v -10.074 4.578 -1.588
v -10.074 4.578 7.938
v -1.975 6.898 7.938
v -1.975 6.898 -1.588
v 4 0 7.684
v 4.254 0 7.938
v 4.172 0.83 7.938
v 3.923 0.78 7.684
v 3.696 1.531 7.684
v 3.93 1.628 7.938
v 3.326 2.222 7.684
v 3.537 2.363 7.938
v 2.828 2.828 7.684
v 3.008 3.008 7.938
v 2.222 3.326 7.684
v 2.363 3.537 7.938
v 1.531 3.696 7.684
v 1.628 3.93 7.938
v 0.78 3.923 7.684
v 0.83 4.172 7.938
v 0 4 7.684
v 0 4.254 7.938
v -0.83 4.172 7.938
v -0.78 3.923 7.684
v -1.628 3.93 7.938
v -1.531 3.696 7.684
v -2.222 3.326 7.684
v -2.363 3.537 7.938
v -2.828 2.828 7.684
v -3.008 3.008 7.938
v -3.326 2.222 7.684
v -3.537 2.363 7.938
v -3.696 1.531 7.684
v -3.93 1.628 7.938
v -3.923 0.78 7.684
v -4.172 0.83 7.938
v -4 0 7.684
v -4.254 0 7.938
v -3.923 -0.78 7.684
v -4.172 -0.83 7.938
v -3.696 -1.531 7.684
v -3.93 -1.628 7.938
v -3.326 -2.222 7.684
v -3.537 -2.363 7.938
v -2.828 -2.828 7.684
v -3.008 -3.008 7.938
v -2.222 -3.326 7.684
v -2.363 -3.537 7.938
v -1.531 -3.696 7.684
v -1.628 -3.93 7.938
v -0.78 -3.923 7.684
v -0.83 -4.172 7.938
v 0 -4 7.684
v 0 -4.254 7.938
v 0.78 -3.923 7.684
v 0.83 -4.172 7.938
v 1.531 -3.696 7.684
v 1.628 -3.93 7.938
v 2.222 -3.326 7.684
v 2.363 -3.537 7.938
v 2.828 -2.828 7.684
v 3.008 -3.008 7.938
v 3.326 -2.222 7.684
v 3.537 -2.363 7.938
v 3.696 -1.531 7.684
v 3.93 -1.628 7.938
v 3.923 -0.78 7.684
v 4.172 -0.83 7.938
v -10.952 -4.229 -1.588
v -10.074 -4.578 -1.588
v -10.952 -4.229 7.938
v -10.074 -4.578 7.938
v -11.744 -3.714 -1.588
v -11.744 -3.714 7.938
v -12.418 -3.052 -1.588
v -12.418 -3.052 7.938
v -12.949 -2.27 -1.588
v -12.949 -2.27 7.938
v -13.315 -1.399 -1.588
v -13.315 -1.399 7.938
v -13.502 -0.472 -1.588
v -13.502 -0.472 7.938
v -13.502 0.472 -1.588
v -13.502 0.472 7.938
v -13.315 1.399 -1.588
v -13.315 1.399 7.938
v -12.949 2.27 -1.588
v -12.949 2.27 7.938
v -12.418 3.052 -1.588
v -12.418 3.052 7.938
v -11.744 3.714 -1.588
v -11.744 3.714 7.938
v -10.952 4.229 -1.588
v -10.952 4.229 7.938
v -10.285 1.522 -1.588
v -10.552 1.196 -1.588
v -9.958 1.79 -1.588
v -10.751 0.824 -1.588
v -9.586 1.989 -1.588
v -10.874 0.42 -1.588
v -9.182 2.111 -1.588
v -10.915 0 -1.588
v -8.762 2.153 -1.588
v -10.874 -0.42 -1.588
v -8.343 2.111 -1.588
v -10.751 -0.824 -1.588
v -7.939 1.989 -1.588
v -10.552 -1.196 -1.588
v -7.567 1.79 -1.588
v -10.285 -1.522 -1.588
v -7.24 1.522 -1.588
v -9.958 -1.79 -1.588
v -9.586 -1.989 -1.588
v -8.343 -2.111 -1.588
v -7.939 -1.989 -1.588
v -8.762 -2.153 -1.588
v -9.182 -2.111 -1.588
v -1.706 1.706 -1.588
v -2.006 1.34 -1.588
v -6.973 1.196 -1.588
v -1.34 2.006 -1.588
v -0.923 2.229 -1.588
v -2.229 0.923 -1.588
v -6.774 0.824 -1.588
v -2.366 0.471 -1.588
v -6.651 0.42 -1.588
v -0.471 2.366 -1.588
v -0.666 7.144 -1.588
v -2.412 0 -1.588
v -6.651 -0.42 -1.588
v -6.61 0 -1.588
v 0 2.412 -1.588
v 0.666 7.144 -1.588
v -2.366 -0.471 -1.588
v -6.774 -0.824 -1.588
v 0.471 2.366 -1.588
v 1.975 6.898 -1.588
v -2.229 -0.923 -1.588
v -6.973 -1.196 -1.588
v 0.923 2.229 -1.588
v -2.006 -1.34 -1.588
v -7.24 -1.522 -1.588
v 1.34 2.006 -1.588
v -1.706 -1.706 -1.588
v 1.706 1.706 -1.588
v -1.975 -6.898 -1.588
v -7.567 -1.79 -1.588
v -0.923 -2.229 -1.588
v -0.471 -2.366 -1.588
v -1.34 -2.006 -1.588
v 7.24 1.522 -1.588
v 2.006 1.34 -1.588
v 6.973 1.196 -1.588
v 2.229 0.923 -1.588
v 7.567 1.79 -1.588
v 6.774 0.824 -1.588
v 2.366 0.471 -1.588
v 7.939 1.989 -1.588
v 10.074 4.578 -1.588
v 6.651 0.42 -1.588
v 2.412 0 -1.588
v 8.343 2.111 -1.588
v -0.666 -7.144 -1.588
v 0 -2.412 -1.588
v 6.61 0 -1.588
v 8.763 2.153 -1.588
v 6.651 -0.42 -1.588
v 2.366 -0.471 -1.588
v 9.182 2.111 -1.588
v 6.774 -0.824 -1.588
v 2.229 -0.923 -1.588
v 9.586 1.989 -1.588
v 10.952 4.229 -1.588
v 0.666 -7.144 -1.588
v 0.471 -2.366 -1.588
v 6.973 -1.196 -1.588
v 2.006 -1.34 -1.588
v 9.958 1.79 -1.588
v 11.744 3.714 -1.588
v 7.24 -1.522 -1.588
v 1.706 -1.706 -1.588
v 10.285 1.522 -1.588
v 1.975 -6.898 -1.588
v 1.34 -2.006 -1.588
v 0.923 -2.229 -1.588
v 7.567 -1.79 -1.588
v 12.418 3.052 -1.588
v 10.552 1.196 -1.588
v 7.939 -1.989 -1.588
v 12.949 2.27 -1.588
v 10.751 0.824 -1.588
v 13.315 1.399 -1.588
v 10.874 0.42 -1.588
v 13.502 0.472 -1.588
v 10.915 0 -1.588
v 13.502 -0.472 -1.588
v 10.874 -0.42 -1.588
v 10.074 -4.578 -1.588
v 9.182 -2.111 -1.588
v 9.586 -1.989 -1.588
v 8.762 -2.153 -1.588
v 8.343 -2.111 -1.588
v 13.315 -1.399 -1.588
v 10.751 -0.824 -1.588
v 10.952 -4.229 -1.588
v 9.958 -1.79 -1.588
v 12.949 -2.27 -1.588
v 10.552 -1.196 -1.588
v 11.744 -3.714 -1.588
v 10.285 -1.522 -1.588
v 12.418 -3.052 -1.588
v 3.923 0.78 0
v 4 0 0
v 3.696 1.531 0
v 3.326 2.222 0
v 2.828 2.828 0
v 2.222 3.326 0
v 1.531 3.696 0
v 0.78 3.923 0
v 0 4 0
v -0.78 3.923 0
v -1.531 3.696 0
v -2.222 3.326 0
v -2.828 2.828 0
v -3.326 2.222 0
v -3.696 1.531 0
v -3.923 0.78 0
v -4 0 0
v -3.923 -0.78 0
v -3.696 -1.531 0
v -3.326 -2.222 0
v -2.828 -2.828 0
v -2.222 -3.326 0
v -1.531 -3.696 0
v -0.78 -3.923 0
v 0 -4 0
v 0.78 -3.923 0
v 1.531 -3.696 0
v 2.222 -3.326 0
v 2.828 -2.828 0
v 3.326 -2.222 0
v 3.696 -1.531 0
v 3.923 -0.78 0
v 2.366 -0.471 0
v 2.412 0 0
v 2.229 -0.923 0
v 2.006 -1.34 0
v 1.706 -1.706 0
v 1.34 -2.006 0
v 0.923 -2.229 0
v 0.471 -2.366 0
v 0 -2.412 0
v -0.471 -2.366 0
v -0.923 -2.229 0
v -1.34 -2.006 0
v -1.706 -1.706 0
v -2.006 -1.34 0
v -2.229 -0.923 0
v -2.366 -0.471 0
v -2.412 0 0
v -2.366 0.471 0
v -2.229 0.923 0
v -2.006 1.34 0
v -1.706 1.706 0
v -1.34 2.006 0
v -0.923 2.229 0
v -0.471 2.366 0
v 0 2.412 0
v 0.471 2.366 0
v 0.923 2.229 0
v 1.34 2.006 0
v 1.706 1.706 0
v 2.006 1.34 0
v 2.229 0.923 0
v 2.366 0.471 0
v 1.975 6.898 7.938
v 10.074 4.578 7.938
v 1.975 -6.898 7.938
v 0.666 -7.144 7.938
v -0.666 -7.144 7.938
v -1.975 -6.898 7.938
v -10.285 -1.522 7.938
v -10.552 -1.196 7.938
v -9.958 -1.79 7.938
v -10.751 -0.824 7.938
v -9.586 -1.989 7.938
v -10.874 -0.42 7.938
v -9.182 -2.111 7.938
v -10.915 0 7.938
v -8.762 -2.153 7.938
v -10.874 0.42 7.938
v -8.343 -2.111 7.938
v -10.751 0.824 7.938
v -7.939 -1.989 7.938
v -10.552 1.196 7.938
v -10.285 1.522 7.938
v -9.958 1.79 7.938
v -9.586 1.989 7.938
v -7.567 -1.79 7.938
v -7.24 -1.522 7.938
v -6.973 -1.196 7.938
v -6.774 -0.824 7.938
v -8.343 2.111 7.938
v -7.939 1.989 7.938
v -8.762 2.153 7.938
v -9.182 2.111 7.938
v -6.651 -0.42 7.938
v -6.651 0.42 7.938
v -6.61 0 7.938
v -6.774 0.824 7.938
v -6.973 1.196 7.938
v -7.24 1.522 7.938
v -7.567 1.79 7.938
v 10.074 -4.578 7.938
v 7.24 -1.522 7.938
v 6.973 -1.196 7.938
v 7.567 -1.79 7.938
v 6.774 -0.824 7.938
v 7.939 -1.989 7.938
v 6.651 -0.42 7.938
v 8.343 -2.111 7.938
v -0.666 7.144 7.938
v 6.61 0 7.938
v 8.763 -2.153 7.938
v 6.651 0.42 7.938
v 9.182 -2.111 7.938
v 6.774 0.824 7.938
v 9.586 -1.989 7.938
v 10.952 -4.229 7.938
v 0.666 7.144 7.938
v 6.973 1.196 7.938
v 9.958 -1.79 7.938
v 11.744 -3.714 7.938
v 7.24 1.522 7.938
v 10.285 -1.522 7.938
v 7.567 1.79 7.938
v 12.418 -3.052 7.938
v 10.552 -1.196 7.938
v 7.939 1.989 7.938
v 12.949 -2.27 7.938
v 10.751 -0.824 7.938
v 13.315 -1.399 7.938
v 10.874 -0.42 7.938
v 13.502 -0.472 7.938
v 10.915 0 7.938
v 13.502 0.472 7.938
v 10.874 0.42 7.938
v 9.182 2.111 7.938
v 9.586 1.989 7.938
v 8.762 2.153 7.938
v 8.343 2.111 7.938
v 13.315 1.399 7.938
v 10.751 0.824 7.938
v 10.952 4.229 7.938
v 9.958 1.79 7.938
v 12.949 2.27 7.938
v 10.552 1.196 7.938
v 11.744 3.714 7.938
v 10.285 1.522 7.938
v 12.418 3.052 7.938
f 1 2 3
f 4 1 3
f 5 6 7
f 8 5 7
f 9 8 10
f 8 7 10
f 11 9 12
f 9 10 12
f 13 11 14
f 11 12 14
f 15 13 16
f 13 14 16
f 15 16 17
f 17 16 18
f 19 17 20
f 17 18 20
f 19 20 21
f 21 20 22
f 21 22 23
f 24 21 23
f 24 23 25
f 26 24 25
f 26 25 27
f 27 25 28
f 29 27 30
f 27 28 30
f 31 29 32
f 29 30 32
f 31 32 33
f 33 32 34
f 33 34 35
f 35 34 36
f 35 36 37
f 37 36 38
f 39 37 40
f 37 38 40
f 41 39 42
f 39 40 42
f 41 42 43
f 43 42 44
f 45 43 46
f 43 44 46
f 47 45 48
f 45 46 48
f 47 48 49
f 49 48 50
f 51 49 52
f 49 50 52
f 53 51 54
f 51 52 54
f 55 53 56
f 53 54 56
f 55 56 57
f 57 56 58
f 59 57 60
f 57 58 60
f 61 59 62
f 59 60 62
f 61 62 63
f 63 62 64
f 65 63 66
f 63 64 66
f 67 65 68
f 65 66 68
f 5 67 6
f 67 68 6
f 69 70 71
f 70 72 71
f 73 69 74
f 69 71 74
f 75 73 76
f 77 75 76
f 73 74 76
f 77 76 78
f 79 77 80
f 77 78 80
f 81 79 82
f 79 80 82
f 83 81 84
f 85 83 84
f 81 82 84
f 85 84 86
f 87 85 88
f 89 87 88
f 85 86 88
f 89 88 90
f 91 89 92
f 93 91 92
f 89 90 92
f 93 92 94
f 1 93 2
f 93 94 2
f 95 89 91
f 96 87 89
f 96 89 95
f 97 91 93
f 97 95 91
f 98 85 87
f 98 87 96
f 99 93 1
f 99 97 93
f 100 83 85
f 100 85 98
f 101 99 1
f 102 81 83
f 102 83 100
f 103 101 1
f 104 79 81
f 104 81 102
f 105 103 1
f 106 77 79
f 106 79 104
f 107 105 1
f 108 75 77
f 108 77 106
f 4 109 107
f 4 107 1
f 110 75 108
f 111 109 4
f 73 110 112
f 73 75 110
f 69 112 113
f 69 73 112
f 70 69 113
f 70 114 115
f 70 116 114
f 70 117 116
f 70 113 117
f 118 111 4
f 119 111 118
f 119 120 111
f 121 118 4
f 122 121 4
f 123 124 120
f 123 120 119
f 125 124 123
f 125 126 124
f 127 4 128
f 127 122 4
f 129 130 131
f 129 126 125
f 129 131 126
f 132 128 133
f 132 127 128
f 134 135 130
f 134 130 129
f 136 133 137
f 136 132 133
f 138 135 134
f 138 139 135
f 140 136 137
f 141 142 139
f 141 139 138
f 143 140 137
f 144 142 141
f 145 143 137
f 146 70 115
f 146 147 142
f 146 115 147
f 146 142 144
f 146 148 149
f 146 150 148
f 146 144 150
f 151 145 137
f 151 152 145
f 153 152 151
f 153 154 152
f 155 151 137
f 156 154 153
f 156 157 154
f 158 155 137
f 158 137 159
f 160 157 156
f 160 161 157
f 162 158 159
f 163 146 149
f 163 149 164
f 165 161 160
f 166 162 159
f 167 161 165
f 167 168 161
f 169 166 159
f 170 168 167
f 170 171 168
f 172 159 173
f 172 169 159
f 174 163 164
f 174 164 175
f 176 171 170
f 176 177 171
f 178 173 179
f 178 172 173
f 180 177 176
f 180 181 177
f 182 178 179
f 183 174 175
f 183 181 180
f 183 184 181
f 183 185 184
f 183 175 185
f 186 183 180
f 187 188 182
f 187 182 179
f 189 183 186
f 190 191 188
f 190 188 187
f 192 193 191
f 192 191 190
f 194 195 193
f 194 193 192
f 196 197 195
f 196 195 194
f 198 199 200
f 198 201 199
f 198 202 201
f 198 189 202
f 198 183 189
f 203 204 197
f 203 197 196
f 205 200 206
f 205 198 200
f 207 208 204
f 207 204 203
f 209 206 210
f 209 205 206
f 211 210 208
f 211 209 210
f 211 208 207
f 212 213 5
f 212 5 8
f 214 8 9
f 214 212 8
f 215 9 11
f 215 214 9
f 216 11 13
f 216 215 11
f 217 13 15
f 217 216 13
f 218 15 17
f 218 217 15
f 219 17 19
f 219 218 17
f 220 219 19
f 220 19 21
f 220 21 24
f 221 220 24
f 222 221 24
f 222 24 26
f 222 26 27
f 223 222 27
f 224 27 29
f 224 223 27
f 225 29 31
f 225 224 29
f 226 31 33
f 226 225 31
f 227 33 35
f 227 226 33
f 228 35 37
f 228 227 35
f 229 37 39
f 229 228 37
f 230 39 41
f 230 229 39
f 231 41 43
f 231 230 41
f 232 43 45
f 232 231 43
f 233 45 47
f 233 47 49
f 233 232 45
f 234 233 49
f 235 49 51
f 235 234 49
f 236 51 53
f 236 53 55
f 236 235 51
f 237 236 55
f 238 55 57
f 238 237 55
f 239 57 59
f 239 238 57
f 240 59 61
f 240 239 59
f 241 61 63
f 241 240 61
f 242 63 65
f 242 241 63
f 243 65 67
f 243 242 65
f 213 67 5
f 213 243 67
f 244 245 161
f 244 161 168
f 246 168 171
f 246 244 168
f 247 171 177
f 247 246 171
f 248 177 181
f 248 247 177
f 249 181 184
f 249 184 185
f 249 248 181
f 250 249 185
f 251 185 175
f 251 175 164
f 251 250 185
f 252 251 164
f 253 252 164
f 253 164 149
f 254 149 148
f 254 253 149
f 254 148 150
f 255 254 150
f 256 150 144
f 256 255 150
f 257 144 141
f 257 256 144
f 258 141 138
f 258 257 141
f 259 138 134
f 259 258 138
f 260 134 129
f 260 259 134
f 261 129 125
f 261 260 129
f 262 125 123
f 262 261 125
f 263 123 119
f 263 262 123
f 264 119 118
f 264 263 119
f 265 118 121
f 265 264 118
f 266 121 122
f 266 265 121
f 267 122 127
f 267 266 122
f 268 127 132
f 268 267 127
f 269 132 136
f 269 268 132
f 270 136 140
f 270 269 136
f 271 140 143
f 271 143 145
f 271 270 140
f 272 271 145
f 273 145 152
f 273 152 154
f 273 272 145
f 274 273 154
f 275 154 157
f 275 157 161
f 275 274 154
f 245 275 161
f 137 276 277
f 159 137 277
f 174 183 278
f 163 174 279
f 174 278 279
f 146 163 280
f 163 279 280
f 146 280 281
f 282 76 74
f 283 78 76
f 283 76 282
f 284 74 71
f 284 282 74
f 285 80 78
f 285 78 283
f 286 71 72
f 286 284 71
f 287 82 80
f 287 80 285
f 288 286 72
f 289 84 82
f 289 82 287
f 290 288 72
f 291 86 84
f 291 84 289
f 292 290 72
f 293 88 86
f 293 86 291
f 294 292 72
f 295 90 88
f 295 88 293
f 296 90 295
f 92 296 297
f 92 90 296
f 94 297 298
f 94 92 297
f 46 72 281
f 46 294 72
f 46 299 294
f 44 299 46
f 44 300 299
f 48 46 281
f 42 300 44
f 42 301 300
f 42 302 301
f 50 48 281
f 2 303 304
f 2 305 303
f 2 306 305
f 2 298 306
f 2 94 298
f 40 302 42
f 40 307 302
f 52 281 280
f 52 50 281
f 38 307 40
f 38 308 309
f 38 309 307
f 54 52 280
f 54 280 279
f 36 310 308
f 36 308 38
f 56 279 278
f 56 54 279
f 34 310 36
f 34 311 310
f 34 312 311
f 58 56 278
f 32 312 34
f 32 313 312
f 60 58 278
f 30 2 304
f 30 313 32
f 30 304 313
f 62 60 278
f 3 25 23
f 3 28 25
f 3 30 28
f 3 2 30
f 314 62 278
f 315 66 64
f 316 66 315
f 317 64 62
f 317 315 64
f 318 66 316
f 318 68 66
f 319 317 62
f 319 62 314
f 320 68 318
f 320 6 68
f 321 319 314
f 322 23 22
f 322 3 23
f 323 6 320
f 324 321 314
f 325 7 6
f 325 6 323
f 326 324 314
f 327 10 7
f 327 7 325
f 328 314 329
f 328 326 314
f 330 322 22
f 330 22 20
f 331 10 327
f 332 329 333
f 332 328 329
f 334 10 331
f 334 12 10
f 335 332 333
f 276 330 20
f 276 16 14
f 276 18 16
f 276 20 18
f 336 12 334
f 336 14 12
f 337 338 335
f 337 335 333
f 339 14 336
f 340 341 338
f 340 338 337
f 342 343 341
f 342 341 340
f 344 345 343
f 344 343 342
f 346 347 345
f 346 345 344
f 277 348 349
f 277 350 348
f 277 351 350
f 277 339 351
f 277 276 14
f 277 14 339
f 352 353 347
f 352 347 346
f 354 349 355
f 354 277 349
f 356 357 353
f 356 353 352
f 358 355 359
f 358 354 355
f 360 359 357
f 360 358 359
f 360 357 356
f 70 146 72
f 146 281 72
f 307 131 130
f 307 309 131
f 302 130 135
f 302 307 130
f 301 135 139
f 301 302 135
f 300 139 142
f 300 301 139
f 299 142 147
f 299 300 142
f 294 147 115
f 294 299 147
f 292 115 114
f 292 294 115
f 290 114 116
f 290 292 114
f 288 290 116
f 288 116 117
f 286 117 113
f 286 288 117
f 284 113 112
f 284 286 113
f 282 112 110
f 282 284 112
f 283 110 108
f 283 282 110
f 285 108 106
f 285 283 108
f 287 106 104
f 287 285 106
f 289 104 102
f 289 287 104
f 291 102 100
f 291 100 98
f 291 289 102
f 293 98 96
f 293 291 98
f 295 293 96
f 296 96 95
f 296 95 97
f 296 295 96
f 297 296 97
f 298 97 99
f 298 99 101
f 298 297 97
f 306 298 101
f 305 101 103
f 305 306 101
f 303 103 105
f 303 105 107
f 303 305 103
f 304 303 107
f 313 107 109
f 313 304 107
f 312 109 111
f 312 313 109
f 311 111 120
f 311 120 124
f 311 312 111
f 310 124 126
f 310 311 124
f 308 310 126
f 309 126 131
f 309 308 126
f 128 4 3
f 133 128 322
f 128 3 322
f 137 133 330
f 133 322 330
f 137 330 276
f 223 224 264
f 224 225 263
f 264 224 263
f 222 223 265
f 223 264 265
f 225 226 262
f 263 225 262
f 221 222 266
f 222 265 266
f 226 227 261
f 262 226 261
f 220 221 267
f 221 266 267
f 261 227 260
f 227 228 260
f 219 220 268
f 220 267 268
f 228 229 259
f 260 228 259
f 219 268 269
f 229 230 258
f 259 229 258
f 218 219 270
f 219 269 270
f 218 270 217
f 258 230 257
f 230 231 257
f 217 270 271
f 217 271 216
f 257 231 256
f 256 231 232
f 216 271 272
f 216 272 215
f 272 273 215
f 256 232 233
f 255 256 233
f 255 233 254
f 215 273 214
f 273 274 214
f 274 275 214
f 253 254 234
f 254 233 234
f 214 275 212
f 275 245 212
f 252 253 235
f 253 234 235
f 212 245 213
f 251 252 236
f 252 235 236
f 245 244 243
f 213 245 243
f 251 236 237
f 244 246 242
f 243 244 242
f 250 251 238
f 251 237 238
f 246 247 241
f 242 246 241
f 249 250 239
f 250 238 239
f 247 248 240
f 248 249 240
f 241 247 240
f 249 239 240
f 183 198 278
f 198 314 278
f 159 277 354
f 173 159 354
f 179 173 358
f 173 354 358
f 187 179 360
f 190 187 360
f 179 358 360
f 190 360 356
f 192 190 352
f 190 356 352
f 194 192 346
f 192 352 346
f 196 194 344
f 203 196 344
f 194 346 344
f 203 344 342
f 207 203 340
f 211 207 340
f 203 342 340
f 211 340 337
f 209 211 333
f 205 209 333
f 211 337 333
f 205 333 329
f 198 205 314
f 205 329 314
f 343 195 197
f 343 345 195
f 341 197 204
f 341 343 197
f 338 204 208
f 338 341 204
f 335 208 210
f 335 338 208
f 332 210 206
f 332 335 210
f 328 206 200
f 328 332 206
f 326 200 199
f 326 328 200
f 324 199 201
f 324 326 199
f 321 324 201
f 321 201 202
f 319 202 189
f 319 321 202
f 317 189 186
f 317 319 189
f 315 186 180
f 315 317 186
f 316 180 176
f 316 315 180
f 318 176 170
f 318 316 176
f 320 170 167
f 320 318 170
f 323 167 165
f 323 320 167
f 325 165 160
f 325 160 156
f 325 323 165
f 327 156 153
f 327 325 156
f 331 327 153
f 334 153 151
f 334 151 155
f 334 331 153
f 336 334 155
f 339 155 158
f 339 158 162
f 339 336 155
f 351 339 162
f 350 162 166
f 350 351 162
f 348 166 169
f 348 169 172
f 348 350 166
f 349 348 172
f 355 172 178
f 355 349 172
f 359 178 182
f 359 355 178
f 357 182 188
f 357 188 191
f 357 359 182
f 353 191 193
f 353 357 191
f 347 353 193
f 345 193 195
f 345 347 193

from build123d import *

# Parameters (mm, degrees)
F0_R     = 2.15265
F0_R_2   = 4
F1_DEPTH = 7.9375
F2_SIZE  = 0.254
F3_R     = 2.15265
F3_R_2   = 4
F3_R_3   = 2.4125
F4_DEPTH = 1.5875


with BuildPart() as f1:
    # F0 (on Top) → F1 (new body)
    with BuildSketch(Plane.XY):
        with BuildLine():
            Line((10.0737161198, 4.5784406229), (1.9754279601, 6.8977031956))
            ThreePointArc((1.9754279601, 6.8977031956), (0, 7.175), (-1.9754279601, 6.8977031956))
            Line((-1.9754279601, 6.8977031956), (-10.0737161198, 4.5784406229))
            ThreePointArc((-10.0737161198, 4.5784406229), (-13.525, 0), (-10.0737161198, -4.5784406229))
            Line((-10.0737161198, -4.5784406229), (-1.9754279601, -6.8977031956))
            ThreePointArc((-1.9754279601, -6.8977031956), (0, -7.175), (1.9754279601, -6.8977031956))
            Line((1.9754279601, -6.8977031956), (10.0737161198, -4.5784406229))
            ThreePointArc((10.0737161198, -4.5784406229), (13.525, 0), (10.0737161198, 4.5784406229))
        make_face()
        with Locations((-8.7625, 0)):
            Circle(F0_R, mode=Mode.SUBTRACT)
        Circle(F0_R_2, mode=Mode.SUBTRACT)
        with Locations((8.7625, 0)):
            Circle(F0_R, mode=Mode.SUBTRACT)
    extrude(amount=F1_DEPTH)

    # F2
    f2_edges = [f1.edges().sort_by_distance(p)[0] for p in [
        (-4, 0, 7.9375),
    ]]
    chamfer(f2_edges, length=F2_SIZE)

    # F3 (on face) → F4 (join)
    with BuildSketch(Plane(origin=(0, 0, 0), x_dir=(1, 0, 0), z_dir=(0, 0, -1))):
        with BuildLine():
            ThreePointArc((10.0737161198, -4.5784406229), (13.525, 0), (10.0737161198, 4.5784406229))
            Line((10.0737161198, 4.5784406229), (1.9754279601, 6.8977031956))
            ThreePointArc((1.9754279601, 6.8977031956), (0, 7.175), (-1.9754279601, 6.8977031956))
            Line((-1.9754279601, 6.8977031956), (-10.0737161198, 4.5784406229))
            ThreePointArc((-10.0737161198, 4.5784406229), (-13.525, 0), (-10.0737161198, -4.5784406229))
            Line((-10.0737161198, -4.5784406229), (-1.9754279601, -6.8977031956))
            ThreePointArc((-1.9754279601, -6.8977031956), (0, -7.175), (1.9754279601, -6.8977031956))
            Line((1.9754279601, -6.8977031956), (10.0737161198, -4.5784406229))
        make_face()
        with Locations((-8.7625, 0)):
            Circle(F3_R, mode=Mode.SUBTRACT)
        Circle(F3_R_2, mode=Mode.SUBTRACT)
        with Locations((8.7625, 0)):
            Circle(F3_R, mode=Mode.SUBTRACT)
        Circle(F3_R_2)
        Circle(F3_R_3, mode=Mode.SUBTRACT)
    extrude(amount=F4_DEPTH)


solid = f1.part
